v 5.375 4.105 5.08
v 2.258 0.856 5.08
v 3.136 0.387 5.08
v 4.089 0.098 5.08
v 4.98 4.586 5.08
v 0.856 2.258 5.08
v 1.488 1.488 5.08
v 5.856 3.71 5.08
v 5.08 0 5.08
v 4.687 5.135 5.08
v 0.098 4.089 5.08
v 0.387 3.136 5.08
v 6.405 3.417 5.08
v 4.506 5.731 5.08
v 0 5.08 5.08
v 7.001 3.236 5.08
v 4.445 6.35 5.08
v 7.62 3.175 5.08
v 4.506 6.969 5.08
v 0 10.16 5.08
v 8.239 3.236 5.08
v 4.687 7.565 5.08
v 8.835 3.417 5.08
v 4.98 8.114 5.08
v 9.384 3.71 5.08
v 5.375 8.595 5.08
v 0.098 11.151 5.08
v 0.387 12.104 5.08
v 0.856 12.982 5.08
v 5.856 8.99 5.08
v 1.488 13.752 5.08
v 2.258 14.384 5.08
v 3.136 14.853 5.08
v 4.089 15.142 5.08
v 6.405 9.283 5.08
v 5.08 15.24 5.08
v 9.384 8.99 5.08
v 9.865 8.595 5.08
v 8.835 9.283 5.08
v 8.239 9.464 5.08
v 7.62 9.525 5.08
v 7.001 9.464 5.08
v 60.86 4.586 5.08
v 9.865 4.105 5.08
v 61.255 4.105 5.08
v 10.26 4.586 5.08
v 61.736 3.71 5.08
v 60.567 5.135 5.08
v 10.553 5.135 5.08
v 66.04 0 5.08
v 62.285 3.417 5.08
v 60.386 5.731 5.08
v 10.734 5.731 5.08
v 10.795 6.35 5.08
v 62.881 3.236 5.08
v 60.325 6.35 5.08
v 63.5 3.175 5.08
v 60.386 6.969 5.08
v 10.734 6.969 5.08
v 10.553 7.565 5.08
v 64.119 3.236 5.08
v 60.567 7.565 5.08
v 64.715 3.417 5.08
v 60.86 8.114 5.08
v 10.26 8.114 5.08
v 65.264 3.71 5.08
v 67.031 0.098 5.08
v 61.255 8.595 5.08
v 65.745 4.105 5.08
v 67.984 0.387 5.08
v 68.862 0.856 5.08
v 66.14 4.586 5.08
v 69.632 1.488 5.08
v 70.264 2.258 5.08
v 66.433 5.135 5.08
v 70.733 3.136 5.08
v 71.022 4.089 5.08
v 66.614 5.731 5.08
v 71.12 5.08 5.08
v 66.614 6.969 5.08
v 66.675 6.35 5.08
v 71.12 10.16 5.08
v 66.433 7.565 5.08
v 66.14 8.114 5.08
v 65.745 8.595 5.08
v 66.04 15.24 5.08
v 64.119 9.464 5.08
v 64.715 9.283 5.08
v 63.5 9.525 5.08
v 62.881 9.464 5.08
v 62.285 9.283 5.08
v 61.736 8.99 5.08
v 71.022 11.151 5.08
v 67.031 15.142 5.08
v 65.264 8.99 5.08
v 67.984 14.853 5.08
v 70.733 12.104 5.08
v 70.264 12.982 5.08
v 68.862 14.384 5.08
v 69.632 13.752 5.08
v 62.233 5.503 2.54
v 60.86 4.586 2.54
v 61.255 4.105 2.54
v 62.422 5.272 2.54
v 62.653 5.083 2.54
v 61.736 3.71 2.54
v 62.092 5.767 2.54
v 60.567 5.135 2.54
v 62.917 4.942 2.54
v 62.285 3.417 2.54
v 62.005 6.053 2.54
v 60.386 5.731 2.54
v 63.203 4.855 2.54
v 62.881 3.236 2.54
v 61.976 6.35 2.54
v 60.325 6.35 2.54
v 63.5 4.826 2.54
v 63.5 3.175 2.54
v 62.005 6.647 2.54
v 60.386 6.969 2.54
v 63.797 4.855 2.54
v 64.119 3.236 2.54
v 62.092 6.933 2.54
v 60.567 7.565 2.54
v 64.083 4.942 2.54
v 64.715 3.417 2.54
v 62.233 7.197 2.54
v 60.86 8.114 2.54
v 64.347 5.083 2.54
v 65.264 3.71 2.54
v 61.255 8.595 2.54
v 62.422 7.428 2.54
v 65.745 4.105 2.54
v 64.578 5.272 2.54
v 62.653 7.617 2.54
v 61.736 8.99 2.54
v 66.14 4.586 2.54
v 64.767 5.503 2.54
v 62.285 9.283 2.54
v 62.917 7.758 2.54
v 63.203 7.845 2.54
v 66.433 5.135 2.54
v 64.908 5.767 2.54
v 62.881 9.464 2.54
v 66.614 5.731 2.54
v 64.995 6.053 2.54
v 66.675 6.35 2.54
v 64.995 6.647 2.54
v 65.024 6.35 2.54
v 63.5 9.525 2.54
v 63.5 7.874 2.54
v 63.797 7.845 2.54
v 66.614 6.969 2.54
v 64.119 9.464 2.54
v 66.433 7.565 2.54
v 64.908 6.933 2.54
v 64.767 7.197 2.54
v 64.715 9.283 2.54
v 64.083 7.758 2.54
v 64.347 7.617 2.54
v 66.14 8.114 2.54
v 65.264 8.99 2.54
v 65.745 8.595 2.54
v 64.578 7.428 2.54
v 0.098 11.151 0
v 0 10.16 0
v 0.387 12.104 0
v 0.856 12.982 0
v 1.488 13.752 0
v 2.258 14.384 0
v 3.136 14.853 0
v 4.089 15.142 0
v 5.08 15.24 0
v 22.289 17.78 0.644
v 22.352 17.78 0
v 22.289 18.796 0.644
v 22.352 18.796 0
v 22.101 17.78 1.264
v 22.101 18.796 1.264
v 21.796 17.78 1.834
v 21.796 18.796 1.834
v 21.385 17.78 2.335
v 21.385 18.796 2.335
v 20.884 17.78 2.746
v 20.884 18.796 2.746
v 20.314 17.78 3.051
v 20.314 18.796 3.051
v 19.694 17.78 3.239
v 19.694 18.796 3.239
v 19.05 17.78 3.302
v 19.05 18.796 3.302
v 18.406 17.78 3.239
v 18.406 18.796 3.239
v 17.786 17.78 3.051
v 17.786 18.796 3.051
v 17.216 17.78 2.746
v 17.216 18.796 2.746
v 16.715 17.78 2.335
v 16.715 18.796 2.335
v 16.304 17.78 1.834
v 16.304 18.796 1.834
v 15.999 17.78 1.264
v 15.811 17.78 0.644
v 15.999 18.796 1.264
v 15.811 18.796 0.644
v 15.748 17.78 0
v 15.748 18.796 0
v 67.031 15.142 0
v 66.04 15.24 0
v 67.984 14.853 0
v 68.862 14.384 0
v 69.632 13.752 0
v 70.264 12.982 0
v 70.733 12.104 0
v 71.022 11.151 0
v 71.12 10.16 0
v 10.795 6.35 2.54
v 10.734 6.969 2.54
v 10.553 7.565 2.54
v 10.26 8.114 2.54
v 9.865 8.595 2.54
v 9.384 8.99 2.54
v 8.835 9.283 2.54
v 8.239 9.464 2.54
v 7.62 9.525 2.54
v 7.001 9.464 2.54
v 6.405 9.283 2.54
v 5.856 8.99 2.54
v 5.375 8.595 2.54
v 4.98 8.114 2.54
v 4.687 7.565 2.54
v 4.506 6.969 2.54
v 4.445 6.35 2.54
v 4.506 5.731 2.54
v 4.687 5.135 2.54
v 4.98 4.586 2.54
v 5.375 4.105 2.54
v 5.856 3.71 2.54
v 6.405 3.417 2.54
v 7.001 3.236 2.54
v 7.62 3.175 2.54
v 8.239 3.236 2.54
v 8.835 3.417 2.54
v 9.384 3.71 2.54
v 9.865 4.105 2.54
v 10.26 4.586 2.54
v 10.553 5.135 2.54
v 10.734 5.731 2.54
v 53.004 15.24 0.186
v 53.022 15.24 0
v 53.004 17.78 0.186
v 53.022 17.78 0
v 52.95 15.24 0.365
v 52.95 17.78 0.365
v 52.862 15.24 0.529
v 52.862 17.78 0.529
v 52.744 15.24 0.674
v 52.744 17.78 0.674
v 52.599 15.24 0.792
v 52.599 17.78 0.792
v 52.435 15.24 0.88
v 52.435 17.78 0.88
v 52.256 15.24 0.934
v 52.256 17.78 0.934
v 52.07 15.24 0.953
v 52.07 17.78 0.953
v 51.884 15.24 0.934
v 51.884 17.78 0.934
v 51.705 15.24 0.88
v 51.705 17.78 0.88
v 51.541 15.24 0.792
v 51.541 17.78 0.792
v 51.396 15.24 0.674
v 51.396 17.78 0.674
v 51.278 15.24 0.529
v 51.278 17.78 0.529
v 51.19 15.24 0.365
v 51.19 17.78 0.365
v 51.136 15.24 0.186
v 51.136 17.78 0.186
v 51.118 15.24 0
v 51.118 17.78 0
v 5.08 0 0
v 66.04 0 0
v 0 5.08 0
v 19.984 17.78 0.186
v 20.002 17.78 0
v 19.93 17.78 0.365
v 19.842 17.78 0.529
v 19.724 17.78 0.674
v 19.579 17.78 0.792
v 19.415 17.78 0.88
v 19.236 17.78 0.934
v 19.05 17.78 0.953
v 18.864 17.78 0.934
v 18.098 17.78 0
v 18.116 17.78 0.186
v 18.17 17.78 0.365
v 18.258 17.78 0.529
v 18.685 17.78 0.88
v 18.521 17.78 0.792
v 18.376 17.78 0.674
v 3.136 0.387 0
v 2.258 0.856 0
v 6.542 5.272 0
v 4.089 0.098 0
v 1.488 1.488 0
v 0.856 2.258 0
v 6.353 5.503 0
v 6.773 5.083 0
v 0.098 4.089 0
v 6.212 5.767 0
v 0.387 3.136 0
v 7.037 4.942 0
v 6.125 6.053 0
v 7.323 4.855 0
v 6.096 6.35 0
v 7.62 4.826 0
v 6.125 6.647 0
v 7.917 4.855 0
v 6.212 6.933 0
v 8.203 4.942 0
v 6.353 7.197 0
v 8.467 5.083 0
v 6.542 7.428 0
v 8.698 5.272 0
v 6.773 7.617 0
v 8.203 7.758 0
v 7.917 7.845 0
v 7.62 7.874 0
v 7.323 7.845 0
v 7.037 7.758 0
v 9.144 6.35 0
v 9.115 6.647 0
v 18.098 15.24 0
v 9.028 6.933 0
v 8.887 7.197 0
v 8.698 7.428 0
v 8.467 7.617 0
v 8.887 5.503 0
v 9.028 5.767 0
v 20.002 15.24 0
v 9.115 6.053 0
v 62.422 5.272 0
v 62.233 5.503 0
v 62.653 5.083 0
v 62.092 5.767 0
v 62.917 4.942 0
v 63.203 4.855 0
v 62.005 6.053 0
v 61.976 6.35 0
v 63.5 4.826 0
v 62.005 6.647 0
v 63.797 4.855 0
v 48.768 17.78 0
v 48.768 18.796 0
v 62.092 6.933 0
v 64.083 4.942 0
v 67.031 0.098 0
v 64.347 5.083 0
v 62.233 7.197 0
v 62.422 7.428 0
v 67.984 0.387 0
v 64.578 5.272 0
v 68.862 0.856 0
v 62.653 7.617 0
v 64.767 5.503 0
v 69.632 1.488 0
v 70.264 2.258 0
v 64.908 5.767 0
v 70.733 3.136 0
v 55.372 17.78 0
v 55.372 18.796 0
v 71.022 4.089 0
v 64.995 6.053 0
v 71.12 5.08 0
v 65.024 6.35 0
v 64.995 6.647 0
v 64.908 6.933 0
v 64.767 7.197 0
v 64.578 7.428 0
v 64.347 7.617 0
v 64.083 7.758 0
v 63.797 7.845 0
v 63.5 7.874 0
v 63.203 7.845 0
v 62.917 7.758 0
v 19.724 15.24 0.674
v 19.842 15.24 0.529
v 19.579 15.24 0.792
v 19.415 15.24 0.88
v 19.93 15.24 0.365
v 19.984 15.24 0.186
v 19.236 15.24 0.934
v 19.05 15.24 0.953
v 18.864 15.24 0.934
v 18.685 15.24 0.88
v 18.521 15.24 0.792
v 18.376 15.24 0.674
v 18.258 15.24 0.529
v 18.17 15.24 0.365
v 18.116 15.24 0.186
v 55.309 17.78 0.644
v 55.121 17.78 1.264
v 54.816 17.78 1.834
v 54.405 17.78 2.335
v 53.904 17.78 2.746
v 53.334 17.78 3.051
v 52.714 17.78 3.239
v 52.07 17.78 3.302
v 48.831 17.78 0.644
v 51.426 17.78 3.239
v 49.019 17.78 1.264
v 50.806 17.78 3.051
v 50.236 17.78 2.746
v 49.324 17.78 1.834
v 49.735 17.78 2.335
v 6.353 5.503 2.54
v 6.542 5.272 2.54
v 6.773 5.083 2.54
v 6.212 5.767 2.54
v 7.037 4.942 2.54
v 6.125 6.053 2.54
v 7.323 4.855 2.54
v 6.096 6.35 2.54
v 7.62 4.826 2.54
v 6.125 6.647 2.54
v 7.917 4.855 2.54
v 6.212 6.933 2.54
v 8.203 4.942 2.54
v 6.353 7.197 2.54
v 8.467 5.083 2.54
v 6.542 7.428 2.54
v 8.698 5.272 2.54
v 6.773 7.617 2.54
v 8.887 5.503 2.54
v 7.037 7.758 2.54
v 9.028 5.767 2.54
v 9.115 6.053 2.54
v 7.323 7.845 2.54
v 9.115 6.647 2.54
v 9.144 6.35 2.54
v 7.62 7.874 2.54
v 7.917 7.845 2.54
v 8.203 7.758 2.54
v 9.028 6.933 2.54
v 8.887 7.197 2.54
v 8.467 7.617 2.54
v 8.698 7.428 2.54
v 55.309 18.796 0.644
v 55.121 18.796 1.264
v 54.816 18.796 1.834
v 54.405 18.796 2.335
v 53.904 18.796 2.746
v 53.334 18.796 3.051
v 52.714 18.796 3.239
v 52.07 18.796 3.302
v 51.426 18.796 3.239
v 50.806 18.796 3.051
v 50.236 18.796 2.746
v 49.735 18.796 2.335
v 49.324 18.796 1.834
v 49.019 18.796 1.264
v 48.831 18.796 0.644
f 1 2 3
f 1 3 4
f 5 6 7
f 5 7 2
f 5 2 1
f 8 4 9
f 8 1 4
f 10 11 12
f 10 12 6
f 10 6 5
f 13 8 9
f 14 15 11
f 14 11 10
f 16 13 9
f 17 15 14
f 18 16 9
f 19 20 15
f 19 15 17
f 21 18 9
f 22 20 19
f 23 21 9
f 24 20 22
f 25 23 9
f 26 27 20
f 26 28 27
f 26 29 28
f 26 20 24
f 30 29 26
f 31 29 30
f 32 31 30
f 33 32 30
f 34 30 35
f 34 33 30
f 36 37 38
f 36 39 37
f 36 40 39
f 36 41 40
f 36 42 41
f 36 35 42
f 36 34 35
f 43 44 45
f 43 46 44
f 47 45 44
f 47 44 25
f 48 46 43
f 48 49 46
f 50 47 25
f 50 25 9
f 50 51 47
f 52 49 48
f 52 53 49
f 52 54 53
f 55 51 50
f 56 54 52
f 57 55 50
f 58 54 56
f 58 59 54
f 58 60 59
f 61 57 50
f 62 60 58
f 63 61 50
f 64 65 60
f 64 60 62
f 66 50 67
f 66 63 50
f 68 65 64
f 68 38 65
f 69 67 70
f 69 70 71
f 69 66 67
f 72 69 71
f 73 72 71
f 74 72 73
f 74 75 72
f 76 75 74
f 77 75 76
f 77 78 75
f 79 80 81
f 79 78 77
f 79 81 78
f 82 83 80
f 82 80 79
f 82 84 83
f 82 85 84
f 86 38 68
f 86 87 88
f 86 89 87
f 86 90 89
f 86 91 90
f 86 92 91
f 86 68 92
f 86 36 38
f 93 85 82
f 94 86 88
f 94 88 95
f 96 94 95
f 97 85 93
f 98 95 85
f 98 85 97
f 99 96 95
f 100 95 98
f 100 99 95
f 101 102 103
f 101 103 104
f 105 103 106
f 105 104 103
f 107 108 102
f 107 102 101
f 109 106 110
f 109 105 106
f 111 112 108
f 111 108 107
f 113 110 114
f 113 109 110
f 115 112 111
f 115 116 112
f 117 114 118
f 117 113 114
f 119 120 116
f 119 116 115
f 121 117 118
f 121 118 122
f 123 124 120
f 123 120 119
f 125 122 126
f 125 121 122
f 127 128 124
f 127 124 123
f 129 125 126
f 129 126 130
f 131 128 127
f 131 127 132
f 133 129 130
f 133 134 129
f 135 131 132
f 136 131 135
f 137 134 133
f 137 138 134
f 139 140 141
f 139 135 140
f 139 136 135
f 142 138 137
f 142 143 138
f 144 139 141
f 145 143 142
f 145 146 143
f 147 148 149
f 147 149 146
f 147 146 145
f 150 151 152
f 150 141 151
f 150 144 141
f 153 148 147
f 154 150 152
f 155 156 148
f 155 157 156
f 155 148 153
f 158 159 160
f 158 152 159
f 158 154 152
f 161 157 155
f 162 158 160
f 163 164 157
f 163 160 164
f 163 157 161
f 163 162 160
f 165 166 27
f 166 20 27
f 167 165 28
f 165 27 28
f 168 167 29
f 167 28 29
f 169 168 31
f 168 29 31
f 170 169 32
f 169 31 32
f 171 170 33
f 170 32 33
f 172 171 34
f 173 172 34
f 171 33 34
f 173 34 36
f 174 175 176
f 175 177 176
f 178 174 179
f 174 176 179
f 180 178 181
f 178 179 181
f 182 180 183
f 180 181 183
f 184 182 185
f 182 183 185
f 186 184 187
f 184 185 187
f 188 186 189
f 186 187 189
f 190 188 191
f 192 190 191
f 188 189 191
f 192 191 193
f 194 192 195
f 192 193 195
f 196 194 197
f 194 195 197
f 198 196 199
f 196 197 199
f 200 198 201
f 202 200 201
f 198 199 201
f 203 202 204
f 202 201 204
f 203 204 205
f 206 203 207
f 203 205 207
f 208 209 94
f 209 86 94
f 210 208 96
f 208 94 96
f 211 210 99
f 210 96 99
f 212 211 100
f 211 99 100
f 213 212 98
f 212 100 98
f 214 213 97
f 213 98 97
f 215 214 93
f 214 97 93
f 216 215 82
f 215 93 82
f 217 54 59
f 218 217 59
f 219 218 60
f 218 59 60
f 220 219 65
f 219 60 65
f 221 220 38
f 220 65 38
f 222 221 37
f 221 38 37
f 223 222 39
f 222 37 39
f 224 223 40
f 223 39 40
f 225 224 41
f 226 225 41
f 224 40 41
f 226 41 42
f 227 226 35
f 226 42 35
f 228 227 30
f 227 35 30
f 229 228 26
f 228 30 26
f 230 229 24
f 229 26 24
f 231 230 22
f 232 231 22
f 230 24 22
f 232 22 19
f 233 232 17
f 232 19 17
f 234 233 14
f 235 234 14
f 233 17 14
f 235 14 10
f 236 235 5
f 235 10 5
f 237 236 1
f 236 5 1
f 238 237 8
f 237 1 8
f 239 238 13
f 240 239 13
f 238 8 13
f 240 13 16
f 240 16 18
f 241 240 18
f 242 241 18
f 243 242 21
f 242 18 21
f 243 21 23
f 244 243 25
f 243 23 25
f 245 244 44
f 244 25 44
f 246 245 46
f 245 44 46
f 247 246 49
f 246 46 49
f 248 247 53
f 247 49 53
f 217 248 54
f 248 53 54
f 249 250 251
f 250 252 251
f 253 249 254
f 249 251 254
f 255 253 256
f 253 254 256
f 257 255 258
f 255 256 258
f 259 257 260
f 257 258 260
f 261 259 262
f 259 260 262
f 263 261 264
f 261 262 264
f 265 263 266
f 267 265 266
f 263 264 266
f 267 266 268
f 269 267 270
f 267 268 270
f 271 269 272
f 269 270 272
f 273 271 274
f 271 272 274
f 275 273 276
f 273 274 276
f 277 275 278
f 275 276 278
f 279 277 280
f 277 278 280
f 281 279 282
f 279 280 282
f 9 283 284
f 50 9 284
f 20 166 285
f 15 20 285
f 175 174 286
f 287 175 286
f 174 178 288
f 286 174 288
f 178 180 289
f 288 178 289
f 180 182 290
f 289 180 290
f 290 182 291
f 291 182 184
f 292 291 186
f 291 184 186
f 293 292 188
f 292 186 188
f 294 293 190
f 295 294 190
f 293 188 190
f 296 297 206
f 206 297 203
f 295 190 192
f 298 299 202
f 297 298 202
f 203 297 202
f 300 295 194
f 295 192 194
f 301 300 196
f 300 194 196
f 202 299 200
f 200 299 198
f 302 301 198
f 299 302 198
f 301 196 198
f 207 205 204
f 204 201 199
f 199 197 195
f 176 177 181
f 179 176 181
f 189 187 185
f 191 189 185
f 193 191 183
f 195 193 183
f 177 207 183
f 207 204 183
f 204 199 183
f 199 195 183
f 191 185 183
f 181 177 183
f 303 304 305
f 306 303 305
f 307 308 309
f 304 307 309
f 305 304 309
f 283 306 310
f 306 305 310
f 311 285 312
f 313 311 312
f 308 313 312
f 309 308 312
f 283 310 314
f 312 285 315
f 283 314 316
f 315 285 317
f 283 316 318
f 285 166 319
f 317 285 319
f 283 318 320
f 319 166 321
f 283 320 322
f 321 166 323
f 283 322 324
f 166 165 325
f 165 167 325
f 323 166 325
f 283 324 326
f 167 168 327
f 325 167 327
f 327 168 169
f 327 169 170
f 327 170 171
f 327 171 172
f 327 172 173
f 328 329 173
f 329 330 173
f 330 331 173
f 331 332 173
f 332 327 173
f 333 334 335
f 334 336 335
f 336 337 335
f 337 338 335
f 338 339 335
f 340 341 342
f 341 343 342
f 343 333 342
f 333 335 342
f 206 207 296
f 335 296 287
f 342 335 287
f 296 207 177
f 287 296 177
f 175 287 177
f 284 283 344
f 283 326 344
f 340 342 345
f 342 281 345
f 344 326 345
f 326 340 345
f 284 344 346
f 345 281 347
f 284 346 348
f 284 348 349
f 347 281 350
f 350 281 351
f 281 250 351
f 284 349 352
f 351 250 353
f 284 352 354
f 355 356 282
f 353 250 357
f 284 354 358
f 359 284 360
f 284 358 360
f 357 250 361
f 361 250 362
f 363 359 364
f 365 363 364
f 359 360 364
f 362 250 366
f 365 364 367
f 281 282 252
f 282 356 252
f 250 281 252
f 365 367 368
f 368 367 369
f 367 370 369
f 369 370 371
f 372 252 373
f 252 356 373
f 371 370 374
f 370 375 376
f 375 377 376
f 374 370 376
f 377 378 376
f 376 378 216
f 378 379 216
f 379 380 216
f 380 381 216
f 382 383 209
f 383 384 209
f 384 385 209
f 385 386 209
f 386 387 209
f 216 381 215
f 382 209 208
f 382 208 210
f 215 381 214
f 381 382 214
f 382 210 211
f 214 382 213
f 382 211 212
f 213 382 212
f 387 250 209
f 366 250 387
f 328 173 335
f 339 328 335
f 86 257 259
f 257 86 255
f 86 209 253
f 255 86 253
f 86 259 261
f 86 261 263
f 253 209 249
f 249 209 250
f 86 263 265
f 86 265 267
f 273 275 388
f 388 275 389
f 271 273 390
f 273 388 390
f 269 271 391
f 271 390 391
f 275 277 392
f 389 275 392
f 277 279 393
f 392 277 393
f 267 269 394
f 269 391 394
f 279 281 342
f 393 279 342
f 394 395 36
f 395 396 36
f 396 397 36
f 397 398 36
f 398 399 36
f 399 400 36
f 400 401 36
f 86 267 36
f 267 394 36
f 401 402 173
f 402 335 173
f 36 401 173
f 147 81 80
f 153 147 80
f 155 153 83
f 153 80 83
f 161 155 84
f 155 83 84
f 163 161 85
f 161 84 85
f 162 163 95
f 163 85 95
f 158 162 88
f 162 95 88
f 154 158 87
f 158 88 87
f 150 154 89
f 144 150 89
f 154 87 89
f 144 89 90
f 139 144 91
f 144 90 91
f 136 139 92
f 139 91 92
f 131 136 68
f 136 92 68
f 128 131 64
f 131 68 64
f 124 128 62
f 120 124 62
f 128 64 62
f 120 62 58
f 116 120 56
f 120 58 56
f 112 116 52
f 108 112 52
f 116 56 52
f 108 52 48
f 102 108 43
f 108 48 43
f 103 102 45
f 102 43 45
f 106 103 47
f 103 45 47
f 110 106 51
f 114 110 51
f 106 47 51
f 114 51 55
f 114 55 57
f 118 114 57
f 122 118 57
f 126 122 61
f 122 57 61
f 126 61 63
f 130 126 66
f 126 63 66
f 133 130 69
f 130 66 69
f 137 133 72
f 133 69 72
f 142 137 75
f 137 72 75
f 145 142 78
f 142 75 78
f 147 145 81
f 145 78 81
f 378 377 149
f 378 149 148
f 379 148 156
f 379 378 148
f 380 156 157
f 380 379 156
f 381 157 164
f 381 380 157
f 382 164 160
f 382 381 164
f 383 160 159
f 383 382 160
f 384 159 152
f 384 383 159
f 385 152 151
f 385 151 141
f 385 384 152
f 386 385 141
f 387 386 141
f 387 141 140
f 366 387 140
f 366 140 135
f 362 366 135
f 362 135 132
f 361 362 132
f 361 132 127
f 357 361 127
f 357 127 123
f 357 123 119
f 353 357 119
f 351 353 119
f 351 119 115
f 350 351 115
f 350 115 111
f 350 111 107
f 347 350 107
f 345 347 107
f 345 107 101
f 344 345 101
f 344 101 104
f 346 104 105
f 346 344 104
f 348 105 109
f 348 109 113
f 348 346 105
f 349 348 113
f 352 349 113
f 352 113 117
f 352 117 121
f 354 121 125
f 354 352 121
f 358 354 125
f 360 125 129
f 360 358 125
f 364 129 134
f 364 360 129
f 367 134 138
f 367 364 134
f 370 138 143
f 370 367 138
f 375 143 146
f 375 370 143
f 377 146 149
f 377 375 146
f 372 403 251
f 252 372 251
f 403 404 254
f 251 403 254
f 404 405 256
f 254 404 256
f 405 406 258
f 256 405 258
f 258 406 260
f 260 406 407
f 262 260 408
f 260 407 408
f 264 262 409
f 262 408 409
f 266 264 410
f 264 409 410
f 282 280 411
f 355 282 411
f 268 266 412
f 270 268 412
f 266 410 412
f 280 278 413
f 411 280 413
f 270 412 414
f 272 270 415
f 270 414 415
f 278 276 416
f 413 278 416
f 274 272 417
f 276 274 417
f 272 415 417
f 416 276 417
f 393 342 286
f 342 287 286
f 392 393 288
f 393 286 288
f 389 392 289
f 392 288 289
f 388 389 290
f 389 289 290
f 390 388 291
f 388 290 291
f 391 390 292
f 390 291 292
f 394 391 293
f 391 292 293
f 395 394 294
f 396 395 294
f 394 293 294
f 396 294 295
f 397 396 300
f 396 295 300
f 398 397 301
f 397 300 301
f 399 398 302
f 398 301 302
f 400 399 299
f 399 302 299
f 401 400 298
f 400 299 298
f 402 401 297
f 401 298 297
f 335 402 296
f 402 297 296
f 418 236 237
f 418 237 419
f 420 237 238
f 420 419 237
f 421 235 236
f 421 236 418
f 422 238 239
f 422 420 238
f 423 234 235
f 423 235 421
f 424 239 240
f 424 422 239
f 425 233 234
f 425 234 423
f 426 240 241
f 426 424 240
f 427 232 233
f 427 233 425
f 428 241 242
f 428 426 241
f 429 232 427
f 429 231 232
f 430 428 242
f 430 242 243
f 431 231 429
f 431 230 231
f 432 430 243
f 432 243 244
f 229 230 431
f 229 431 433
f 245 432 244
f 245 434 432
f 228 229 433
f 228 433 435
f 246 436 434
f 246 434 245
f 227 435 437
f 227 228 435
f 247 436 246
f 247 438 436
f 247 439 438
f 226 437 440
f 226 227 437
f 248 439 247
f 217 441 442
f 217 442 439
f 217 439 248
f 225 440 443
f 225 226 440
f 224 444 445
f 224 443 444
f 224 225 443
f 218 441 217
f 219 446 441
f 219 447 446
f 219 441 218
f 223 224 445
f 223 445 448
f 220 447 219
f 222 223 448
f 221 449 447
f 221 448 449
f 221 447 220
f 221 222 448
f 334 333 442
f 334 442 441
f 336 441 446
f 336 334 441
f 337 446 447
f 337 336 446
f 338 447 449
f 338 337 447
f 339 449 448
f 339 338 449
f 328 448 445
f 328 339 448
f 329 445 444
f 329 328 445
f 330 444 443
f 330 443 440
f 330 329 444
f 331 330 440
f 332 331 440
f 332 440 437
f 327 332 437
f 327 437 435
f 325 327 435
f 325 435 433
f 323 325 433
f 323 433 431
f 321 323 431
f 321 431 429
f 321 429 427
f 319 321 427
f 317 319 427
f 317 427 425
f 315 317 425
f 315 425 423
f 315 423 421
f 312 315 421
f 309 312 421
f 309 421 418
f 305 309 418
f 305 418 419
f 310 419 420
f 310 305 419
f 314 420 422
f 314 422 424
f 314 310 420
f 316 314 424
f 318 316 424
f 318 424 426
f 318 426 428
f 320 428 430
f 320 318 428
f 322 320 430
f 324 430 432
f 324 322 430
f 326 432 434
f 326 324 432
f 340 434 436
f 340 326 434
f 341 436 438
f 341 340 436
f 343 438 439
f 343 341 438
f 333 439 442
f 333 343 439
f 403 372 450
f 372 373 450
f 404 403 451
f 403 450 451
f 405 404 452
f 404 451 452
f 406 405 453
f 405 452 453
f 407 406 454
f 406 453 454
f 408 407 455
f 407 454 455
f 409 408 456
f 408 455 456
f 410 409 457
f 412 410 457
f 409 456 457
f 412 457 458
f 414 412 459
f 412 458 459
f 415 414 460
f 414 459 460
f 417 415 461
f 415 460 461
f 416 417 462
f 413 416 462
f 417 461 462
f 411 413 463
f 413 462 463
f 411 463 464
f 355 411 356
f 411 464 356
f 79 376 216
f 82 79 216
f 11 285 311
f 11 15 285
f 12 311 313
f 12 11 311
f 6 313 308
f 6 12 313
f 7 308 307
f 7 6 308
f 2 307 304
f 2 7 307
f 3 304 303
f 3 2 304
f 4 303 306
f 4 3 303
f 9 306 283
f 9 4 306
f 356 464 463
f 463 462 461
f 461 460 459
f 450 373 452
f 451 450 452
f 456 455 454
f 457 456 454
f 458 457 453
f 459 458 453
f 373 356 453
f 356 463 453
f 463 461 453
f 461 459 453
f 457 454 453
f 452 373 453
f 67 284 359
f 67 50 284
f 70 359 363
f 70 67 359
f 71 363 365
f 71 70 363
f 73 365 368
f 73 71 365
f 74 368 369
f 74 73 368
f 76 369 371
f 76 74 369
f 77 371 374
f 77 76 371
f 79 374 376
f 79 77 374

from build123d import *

# Parameters (mm, degrees)
F0_R     = 1.524
F1_DEPTH = 5.08
F2_ANGLE = 180
F3_ANGLE = 180
F4_R     = 3.175
F4_R_2   = 1.524
F5_DEPTH = 2.54
F6_R     = 5.08


with BuildPart() as f1:
    # F0 (on Top) → F1 (new body)
    with BuildSketch(Plane.XY):
        Polygon((0, 15.24), (0, 0), (71.12, 0), (71.12, 15.24), (53.0225, 15.24), (52.07, 15.24), (20.0025, 15.24), (19.05, 15.24), align=None)
        with Locations((7.62, 6.35)):
            Circle(F0_R, mode=Mode.SUBTRACT)
        with Locations((63.5, 6.35)):
            Circle(F0_R, mode=Mode.SUBTRACT)
    extrude(amount=F1_DEPTH)

    # F0 (on Top) → F2 (revolve)
    with BuildSketch(Plane.XY):
        Polygon((19.05, 18.796), (19.05, 15.24), (20.0025, 15.24), (20.0025, 17.78), (22.352, 17.78), (22.352, 18.796), align=None)
    revolve(axis=Axis((19.05, 5.626085, 0), (0, -1, 0)), revolution_arc=F2_ANGLE)

    # F0 (on Top) → F3 (revolve)
    with BuildSketch(Plane.XY):
        Polygon((52.07, 15.24), (53.0225, 15.24), (53.0225, 17.78), (55.372, 17.78), (55.372, 18.796), (52.07, 18.796), align=None)
    revolve(axis=Axis((52.07, 5.626085, 0), (0, -1, 0)), revolution_arc=F3_ANGLE)

    # F4 (on face) → F5 (cut)
    with BuildSketch(Plane.XY.offset(5.08)):
        with Locations((7.62, 6.35)):
            Circle(F4_R)
        with Locations((7.62, 6.35)):
            Circle(F4_R_2, mode=Mode.SUBTRACT)
        with Locations((63.5, 6.35)):
            Circle(F4_R)
        with Locations((63.5, 6.35)):
            Circle(F4_R_2, mode=Mode.SUBTRACT)
    extrude(amount=-F5_DEPTH, mode=Mode.SUBTRACT)

    # F6
    f6_edges = [f1.edges().sort_by_distance(p)[0] for p in [
        (71.12, 15.24, 2.54),
        (71.12, 0, 2.54),
        (0, 15.24, 2.54),
        (0, 0, 2.54),
    ]]
    fillet(f6_edges, radius=F6_R)


solid = f1.part
